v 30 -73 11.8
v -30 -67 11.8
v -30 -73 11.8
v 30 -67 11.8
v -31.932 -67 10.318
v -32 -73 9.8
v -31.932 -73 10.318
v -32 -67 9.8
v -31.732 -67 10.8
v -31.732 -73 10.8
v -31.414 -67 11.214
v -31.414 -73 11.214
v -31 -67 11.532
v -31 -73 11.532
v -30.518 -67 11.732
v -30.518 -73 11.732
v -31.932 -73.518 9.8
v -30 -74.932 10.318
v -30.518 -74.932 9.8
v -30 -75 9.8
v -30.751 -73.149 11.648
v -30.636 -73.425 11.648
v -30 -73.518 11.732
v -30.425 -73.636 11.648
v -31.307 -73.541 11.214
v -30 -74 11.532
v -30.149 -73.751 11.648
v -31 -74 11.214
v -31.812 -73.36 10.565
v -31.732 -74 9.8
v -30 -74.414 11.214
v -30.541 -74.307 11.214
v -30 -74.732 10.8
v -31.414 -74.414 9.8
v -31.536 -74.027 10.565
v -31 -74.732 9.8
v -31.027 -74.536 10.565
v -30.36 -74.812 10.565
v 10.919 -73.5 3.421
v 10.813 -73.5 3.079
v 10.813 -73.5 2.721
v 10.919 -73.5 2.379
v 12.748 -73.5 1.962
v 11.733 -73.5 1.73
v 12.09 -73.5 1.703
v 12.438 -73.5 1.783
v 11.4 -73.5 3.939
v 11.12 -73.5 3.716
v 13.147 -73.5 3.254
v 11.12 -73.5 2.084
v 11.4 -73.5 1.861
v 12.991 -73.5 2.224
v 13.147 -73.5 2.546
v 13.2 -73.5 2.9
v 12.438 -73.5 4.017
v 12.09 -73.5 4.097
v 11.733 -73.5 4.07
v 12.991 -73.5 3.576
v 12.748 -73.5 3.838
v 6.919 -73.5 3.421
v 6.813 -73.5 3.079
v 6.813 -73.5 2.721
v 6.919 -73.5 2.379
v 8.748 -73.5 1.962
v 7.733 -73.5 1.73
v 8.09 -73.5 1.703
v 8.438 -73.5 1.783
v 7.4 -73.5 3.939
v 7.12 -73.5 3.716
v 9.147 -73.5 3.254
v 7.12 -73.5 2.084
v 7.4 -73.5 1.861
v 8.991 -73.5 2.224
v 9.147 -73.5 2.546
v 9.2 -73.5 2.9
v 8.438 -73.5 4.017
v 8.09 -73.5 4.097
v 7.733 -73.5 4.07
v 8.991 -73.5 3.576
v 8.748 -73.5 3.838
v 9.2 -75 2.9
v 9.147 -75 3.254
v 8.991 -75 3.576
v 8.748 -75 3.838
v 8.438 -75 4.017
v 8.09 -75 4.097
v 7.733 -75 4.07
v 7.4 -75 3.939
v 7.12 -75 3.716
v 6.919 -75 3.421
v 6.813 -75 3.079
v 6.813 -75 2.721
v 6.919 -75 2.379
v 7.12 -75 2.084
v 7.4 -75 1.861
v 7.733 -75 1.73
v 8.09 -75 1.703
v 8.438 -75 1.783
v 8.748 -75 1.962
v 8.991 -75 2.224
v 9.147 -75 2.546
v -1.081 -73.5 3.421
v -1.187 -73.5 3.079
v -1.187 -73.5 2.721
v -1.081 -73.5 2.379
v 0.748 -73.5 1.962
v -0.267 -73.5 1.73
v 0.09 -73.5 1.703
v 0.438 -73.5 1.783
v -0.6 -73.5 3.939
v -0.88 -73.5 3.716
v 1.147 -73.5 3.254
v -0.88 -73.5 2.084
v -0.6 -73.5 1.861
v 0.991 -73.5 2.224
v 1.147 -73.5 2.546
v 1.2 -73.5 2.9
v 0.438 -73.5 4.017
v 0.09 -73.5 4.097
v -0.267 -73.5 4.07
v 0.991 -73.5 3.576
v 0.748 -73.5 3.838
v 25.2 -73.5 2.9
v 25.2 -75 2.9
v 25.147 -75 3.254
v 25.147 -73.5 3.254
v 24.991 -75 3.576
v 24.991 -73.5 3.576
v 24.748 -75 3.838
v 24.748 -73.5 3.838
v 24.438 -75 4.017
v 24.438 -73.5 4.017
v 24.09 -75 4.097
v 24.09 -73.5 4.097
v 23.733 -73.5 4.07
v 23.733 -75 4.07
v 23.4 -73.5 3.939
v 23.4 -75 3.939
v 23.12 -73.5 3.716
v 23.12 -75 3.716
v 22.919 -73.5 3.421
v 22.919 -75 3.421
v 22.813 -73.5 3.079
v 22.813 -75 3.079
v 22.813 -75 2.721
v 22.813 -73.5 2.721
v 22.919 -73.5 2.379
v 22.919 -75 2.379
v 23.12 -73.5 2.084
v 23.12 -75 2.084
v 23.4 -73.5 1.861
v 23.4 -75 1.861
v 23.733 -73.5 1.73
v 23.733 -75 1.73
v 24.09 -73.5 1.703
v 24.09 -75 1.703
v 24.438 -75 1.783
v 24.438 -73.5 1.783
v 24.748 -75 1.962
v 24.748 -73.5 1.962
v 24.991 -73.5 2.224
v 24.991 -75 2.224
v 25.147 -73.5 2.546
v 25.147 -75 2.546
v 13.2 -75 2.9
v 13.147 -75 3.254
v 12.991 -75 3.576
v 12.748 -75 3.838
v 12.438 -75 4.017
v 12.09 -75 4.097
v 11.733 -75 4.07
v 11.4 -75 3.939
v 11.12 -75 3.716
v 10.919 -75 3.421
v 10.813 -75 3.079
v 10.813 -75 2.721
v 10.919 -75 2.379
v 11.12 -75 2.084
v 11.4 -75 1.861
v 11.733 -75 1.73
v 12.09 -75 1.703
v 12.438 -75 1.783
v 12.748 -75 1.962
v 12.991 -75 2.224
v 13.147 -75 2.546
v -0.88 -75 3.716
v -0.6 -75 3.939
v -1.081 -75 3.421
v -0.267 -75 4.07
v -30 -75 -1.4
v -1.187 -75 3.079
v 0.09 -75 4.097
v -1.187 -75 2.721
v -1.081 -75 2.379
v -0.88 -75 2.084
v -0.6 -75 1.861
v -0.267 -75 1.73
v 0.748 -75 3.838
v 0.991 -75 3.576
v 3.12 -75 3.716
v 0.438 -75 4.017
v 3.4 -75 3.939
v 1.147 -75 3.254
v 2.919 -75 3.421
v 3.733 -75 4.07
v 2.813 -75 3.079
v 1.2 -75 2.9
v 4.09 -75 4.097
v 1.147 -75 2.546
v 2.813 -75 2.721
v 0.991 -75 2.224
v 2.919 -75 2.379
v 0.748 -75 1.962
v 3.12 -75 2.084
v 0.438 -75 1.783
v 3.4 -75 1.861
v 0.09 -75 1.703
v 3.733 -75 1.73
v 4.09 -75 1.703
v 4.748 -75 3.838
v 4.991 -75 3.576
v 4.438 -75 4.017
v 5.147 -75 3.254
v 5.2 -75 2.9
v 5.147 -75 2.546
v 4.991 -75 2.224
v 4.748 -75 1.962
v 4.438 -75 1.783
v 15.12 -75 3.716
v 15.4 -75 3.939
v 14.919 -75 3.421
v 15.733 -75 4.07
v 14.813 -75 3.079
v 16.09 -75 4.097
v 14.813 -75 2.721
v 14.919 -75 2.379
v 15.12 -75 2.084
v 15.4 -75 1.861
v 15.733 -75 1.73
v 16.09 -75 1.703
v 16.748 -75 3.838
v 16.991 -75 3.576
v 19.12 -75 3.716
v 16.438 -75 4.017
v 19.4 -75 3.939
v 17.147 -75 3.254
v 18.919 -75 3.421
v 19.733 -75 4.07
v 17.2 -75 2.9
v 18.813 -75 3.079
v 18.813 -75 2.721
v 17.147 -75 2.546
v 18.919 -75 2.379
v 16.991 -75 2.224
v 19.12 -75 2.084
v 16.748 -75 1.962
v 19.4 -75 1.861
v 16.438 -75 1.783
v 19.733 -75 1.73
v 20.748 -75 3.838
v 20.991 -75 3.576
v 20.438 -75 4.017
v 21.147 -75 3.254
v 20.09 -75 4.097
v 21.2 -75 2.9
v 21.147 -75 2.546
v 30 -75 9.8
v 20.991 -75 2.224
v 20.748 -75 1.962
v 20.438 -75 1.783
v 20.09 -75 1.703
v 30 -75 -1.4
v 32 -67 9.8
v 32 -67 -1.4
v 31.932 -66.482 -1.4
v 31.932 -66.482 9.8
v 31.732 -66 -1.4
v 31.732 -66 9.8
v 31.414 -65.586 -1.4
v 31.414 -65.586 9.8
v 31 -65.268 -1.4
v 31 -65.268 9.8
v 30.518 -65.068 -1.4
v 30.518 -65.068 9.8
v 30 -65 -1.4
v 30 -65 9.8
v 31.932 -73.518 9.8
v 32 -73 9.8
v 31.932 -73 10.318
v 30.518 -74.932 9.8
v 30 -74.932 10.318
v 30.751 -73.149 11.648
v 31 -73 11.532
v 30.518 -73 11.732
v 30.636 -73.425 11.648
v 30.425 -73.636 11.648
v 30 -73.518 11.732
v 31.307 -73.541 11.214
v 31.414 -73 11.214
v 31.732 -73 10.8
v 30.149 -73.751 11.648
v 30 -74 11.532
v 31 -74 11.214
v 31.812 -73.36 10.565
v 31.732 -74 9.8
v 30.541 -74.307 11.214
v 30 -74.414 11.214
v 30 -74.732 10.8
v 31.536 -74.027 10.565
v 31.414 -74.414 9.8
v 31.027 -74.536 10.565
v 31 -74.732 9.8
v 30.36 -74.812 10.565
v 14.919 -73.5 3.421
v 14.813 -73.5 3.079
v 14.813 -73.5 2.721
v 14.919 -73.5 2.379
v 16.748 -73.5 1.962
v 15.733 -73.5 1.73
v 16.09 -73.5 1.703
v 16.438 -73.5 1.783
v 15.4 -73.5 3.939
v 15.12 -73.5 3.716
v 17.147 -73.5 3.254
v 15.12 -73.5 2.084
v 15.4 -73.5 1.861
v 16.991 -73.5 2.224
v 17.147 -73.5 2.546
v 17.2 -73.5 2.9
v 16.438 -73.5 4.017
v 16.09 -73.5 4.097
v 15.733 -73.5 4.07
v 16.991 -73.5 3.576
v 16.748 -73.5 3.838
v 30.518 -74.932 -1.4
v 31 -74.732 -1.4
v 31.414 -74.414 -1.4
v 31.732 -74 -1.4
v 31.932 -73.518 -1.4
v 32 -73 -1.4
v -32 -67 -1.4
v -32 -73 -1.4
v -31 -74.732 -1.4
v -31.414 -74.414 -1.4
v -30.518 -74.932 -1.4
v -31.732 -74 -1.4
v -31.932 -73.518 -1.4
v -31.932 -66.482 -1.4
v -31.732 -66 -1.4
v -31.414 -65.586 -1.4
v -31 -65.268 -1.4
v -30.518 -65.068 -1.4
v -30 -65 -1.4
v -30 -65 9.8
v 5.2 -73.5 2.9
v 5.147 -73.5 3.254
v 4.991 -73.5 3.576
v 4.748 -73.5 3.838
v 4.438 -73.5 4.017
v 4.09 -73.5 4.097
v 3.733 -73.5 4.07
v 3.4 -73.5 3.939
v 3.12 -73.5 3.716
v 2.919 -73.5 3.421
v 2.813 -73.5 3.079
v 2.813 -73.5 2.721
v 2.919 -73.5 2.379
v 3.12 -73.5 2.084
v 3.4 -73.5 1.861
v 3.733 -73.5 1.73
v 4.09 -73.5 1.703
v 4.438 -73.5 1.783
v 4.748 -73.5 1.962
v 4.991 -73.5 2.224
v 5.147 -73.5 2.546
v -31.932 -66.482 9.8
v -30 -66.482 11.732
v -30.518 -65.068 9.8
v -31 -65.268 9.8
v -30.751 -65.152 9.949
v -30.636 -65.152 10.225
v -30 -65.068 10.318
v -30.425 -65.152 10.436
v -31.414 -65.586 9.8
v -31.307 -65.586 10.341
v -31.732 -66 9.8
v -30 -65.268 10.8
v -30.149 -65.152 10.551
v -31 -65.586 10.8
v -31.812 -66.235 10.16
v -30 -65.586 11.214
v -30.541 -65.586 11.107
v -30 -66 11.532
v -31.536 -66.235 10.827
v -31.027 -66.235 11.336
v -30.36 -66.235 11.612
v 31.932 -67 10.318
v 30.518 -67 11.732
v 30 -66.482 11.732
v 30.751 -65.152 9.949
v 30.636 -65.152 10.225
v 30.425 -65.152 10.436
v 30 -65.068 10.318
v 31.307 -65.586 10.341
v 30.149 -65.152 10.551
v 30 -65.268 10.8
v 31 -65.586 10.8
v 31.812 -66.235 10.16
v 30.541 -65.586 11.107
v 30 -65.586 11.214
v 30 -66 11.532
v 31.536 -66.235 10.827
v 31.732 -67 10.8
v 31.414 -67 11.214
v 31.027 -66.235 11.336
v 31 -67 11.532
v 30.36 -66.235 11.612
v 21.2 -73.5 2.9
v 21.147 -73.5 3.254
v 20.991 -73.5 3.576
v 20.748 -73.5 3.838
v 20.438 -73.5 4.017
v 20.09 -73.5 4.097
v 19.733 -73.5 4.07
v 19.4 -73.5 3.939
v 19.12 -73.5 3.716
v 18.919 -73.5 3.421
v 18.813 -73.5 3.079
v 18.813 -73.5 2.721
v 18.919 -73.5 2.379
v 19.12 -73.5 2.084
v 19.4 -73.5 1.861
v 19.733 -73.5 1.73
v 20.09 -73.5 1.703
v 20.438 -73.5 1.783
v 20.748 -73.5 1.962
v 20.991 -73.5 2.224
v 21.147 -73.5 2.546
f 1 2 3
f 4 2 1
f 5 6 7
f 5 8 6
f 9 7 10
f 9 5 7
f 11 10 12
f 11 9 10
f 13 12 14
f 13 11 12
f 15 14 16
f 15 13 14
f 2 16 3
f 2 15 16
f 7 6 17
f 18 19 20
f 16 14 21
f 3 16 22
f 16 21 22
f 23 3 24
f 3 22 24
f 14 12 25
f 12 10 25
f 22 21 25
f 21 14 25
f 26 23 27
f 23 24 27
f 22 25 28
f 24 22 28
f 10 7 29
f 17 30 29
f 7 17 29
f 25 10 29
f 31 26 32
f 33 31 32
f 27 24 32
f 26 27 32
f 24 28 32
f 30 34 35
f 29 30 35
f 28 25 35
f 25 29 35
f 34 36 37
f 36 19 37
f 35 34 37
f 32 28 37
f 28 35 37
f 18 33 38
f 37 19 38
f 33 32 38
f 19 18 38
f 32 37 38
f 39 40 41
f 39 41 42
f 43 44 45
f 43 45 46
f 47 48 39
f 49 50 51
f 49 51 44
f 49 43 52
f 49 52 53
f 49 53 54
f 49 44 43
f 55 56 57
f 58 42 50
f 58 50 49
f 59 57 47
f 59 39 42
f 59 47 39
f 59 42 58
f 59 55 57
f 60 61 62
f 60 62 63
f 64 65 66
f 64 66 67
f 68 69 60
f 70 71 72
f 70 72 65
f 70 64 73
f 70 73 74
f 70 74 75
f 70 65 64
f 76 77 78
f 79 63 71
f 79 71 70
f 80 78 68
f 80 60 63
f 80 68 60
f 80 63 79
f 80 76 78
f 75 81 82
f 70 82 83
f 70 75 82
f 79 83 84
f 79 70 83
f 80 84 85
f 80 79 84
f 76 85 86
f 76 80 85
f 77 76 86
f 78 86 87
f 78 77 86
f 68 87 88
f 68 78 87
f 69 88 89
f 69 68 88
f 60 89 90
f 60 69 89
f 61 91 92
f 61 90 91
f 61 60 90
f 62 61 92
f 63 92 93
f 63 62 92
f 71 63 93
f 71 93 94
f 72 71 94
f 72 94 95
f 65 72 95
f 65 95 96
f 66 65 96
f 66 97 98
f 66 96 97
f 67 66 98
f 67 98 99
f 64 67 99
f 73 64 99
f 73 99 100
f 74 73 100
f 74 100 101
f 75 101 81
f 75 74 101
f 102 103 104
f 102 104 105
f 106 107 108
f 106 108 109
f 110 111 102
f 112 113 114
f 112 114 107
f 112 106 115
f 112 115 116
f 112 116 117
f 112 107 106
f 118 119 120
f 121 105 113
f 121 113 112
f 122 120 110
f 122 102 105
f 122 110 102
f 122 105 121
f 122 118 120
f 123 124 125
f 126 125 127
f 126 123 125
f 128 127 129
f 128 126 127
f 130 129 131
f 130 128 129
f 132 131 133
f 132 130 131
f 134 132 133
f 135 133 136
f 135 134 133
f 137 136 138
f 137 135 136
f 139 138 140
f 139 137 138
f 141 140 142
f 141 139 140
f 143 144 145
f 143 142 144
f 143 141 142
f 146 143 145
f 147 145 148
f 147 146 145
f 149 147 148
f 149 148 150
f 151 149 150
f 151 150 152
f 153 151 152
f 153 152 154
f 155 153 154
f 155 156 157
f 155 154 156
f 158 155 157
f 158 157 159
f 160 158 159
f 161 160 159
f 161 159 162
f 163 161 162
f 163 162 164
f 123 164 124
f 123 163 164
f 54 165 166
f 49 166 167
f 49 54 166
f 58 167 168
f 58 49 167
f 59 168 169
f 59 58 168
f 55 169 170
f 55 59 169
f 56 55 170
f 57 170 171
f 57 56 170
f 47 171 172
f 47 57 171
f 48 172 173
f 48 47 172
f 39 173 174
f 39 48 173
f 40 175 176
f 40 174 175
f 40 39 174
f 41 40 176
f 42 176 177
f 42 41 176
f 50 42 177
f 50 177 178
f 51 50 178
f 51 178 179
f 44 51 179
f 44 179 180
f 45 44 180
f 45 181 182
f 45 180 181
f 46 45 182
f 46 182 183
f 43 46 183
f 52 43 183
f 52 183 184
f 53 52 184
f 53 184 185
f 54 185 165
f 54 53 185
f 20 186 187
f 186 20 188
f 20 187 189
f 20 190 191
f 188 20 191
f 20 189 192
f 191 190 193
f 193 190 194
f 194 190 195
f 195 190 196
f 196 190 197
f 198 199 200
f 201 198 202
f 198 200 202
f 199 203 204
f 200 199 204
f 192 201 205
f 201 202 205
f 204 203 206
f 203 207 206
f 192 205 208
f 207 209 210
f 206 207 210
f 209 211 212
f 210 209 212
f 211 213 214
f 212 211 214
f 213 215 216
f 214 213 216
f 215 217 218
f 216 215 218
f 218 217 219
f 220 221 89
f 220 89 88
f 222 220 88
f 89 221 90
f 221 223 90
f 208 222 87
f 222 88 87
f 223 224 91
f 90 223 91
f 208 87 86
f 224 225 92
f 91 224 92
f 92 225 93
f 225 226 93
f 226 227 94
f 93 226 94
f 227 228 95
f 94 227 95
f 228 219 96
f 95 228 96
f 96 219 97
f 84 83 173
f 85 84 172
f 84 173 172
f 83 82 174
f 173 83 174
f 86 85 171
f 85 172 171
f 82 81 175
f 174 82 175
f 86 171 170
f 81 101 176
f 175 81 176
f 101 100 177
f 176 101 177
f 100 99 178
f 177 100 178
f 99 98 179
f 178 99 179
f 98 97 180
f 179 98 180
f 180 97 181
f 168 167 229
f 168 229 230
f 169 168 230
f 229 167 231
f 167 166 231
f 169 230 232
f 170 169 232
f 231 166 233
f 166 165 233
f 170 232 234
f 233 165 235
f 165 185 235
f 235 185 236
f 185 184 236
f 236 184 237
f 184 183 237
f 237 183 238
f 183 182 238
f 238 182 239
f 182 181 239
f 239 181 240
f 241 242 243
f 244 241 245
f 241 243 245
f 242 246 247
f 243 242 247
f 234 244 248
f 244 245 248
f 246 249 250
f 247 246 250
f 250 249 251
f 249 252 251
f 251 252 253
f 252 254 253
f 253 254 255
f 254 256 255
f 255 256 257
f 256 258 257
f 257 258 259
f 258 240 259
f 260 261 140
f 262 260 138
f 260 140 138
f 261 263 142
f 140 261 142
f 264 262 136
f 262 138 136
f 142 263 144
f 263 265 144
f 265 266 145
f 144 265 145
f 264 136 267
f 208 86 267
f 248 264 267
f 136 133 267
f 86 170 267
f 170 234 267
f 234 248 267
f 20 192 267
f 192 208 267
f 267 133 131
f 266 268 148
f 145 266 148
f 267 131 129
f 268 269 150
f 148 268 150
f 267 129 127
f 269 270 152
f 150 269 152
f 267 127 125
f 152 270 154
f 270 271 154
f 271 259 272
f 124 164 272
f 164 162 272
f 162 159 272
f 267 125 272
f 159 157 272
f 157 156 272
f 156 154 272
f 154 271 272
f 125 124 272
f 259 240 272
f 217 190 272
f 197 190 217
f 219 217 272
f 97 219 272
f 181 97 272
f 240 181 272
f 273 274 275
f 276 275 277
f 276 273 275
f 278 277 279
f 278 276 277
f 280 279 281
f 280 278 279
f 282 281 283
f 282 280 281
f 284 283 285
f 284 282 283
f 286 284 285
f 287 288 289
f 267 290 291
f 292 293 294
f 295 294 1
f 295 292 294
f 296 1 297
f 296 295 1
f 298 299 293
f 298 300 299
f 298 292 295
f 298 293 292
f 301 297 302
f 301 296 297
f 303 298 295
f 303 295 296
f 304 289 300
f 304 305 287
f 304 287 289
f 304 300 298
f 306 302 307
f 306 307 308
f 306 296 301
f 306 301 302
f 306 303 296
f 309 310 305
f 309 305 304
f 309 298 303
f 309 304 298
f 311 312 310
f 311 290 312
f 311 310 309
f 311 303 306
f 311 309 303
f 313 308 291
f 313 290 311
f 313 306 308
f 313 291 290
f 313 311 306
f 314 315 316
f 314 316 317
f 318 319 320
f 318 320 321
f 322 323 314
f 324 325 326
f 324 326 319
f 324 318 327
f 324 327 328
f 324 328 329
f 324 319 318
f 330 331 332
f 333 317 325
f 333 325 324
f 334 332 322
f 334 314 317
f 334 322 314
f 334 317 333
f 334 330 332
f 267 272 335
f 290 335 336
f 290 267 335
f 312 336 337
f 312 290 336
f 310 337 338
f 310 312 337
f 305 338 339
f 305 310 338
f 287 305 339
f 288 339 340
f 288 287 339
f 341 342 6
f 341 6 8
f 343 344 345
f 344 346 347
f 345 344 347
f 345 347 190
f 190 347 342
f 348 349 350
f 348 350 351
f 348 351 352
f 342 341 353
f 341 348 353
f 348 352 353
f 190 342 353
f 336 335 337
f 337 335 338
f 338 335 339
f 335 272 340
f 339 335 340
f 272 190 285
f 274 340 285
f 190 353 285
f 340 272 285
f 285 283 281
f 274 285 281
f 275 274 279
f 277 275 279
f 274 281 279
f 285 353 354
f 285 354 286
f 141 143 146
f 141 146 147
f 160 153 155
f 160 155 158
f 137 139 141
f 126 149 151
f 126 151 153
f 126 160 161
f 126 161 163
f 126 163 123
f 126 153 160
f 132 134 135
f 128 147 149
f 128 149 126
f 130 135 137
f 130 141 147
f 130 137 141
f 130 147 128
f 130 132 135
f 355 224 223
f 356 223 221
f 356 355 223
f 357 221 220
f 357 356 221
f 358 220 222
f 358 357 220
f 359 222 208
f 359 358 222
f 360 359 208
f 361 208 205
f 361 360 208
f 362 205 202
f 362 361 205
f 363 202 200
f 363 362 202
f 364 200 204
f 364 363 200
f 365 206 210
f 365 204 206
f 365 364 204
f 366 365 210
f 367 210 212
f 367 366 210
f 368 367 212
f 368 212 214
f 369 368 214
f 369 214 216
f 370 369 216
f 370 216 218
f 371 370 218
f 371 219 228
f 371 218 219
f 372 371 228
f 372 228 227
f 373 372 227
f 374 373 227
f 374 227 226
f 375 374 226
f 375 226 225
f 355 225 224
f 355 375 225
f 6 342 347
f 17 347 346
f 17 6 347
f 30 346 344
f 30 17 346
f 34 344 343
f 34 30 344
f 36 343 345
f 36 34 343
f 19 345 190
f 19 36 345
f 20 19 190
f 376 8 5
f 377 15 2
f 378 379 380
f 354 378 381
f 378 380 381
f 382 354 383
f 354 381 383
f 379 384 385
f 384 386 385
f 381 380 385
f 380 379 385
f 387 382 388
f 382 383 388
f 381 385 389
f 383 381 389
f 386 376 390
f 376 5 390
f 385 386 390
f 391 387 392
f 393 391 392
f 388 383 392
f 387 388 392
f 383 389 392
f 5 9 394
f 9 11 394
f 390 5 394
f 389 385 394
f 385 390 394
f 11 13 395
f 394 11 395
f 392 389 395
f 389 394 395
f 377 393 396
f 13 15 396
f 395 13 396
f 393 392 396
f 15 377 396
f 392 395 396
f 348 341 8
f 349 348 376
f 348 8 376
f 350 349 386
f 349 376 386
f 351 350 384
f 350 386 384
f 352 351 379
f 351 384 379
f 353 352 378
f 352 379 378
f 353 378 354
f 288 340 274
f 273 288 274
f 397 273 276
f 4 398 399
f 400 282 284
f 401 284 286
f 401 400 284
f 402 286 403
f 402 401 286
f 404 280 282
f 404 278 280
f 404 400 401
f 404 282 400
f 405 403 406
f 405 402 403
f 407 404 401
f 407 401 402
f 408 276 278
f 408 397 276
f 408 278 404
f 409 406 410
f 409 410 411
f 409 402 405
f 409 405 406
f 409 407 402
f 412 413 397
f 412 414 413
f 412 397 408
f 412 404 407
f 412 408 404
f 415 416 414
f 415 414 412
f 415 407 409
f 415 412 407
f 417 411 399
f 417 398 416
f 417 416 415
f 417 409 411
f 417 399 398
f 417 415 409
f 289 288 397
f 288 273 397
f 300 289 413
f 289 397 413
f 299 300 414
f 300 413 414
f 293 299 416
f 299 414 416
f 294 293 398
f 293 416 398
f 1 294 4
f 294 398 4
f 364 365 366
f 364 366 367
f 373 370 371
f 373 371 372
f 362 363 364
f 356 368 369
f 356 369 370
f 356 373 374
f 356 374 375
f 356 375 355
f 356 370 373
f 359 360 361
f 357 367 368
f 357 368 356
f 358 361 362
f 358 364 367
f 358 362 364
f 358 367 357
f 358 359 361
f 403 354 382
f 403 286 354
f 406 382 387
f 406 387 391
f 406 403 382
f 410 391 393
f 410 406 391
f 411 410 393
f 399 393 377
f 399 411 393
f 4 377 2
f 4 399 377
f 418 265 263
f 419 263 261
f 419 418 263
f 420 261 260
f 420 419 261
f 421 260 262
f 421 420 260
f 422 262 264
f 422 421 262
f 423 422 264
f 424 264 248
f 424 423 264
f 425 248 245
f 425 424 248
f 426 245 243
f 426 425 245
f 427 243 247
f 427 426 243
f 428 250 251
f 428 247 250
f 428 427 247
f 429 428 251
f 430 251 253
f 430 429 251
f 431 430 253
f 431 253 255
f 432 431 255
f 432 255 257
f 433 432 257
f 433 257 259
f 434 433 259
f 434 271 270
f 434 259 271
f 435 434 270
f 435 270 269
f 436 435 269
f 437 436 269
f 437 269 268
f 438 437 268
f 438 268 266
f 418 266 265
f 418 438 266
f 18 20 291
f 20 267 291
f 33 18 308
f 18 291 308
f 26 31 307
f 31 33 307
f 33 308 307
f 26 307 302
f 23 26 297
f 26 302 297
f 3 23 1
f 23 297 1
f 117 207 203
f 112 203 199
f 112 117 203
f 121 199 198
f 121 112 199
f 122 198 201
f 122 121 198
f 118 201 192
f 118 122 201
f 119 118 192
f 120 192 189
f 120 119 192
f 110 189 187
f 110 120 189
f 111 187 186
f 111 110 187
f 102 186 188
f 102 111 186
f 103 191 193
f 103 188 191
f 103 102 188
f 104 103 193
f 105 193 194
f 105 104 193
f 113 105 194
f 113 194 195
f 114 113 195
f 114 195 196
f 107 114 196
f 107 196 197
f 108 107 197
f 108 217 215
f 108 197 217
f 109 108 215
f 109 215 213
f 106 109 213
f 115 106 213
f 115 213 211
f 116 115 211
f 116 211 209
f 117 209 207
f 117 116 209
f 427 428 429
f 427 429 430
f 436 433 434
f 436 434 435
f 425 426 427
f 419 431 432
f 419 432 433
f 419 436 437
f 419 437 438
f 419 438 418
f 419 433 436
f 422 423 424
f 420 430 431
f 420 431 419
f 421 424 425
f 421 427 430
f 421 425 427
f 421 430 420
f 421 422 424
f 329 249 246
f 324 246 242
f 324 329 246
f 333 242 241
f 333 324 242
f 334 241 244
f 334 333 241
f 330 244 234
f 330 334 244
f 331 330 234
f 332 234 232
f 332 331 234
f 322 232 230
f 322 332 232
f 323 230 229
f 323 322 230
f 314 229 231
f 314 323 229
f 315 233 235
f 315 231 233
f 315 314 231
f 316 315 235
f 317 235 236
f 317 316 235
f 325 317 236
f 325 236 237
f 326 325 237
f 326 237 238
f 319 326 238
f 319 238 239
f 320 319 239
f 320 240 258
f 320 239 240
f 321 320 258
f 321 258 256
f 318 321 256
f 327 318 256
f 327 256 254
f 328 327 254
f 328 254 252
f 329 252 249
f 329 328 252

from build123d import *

# Parameters (mm, degrees)
CYLINDER005_R     = 1.2
CYLINDER005_DEPTH = 1.8
ARRAY007_X_COUNT  = 7
ARRAY007_X_PITCH  = 4
BOX015_W          = 64
BOX015_H          = 10
BOX015_DEPTH      = 13.2
FILLET006_R       = 2


with BuildPart() as array007:
    # Cylinder005 → Cylinder005 (new body)
    with BuildSketch(Plane(origin=(0, -73.5, 2.9), x_dir=(1, 0, 0), z_dir=(0, -1, 0))):
        Circle(CYLINDER005_R)
    extrude(amount=CYLINDER005_DEPTH)

    # Array007 X: Array007 ×7


with BuildPart() as array007_1:
    add(array007.part)
    with Locations(*[(i * ARRAY007_X_PITCH, 0, 0) for i in range(1, ARRAY007_X_COUNT)]):
        add(array007.part)


with BuildPart() as seitenteil:
    # Box015 → Box015 (new body)
    with BuildSketch(Plane(origin=(-32, -75, -1.4), x_dir=(1, 0, 0), z_dir=(0, 0, 1))):
        with Locations((32, 5)):
            Rectangle(BOX015_W, BOX015_H)
    extrude(amount=BOX015_DEPTH)

    # Fillet006
    fillet006_edges = [seitenteil.edges().sort_by_distance(p)[0] for p in [
        (-32, -75, 5.2),
        (-32, -70, 11.8),
        (-32, -65, 5.2),
        (32, -75, 5.2),
        (32, -70, 11.8),
        (32, -65, 5.2),
        (0, -75, 11.8),
        (0, -65, 11.8),
    ]]
    fillet(fillet006_edges, radius=FILLET006_R)

    # Cut010: cut Array007
    add(array007_1.part, mode=Mode.SUBTRACT)


solid = seitenteil.part
